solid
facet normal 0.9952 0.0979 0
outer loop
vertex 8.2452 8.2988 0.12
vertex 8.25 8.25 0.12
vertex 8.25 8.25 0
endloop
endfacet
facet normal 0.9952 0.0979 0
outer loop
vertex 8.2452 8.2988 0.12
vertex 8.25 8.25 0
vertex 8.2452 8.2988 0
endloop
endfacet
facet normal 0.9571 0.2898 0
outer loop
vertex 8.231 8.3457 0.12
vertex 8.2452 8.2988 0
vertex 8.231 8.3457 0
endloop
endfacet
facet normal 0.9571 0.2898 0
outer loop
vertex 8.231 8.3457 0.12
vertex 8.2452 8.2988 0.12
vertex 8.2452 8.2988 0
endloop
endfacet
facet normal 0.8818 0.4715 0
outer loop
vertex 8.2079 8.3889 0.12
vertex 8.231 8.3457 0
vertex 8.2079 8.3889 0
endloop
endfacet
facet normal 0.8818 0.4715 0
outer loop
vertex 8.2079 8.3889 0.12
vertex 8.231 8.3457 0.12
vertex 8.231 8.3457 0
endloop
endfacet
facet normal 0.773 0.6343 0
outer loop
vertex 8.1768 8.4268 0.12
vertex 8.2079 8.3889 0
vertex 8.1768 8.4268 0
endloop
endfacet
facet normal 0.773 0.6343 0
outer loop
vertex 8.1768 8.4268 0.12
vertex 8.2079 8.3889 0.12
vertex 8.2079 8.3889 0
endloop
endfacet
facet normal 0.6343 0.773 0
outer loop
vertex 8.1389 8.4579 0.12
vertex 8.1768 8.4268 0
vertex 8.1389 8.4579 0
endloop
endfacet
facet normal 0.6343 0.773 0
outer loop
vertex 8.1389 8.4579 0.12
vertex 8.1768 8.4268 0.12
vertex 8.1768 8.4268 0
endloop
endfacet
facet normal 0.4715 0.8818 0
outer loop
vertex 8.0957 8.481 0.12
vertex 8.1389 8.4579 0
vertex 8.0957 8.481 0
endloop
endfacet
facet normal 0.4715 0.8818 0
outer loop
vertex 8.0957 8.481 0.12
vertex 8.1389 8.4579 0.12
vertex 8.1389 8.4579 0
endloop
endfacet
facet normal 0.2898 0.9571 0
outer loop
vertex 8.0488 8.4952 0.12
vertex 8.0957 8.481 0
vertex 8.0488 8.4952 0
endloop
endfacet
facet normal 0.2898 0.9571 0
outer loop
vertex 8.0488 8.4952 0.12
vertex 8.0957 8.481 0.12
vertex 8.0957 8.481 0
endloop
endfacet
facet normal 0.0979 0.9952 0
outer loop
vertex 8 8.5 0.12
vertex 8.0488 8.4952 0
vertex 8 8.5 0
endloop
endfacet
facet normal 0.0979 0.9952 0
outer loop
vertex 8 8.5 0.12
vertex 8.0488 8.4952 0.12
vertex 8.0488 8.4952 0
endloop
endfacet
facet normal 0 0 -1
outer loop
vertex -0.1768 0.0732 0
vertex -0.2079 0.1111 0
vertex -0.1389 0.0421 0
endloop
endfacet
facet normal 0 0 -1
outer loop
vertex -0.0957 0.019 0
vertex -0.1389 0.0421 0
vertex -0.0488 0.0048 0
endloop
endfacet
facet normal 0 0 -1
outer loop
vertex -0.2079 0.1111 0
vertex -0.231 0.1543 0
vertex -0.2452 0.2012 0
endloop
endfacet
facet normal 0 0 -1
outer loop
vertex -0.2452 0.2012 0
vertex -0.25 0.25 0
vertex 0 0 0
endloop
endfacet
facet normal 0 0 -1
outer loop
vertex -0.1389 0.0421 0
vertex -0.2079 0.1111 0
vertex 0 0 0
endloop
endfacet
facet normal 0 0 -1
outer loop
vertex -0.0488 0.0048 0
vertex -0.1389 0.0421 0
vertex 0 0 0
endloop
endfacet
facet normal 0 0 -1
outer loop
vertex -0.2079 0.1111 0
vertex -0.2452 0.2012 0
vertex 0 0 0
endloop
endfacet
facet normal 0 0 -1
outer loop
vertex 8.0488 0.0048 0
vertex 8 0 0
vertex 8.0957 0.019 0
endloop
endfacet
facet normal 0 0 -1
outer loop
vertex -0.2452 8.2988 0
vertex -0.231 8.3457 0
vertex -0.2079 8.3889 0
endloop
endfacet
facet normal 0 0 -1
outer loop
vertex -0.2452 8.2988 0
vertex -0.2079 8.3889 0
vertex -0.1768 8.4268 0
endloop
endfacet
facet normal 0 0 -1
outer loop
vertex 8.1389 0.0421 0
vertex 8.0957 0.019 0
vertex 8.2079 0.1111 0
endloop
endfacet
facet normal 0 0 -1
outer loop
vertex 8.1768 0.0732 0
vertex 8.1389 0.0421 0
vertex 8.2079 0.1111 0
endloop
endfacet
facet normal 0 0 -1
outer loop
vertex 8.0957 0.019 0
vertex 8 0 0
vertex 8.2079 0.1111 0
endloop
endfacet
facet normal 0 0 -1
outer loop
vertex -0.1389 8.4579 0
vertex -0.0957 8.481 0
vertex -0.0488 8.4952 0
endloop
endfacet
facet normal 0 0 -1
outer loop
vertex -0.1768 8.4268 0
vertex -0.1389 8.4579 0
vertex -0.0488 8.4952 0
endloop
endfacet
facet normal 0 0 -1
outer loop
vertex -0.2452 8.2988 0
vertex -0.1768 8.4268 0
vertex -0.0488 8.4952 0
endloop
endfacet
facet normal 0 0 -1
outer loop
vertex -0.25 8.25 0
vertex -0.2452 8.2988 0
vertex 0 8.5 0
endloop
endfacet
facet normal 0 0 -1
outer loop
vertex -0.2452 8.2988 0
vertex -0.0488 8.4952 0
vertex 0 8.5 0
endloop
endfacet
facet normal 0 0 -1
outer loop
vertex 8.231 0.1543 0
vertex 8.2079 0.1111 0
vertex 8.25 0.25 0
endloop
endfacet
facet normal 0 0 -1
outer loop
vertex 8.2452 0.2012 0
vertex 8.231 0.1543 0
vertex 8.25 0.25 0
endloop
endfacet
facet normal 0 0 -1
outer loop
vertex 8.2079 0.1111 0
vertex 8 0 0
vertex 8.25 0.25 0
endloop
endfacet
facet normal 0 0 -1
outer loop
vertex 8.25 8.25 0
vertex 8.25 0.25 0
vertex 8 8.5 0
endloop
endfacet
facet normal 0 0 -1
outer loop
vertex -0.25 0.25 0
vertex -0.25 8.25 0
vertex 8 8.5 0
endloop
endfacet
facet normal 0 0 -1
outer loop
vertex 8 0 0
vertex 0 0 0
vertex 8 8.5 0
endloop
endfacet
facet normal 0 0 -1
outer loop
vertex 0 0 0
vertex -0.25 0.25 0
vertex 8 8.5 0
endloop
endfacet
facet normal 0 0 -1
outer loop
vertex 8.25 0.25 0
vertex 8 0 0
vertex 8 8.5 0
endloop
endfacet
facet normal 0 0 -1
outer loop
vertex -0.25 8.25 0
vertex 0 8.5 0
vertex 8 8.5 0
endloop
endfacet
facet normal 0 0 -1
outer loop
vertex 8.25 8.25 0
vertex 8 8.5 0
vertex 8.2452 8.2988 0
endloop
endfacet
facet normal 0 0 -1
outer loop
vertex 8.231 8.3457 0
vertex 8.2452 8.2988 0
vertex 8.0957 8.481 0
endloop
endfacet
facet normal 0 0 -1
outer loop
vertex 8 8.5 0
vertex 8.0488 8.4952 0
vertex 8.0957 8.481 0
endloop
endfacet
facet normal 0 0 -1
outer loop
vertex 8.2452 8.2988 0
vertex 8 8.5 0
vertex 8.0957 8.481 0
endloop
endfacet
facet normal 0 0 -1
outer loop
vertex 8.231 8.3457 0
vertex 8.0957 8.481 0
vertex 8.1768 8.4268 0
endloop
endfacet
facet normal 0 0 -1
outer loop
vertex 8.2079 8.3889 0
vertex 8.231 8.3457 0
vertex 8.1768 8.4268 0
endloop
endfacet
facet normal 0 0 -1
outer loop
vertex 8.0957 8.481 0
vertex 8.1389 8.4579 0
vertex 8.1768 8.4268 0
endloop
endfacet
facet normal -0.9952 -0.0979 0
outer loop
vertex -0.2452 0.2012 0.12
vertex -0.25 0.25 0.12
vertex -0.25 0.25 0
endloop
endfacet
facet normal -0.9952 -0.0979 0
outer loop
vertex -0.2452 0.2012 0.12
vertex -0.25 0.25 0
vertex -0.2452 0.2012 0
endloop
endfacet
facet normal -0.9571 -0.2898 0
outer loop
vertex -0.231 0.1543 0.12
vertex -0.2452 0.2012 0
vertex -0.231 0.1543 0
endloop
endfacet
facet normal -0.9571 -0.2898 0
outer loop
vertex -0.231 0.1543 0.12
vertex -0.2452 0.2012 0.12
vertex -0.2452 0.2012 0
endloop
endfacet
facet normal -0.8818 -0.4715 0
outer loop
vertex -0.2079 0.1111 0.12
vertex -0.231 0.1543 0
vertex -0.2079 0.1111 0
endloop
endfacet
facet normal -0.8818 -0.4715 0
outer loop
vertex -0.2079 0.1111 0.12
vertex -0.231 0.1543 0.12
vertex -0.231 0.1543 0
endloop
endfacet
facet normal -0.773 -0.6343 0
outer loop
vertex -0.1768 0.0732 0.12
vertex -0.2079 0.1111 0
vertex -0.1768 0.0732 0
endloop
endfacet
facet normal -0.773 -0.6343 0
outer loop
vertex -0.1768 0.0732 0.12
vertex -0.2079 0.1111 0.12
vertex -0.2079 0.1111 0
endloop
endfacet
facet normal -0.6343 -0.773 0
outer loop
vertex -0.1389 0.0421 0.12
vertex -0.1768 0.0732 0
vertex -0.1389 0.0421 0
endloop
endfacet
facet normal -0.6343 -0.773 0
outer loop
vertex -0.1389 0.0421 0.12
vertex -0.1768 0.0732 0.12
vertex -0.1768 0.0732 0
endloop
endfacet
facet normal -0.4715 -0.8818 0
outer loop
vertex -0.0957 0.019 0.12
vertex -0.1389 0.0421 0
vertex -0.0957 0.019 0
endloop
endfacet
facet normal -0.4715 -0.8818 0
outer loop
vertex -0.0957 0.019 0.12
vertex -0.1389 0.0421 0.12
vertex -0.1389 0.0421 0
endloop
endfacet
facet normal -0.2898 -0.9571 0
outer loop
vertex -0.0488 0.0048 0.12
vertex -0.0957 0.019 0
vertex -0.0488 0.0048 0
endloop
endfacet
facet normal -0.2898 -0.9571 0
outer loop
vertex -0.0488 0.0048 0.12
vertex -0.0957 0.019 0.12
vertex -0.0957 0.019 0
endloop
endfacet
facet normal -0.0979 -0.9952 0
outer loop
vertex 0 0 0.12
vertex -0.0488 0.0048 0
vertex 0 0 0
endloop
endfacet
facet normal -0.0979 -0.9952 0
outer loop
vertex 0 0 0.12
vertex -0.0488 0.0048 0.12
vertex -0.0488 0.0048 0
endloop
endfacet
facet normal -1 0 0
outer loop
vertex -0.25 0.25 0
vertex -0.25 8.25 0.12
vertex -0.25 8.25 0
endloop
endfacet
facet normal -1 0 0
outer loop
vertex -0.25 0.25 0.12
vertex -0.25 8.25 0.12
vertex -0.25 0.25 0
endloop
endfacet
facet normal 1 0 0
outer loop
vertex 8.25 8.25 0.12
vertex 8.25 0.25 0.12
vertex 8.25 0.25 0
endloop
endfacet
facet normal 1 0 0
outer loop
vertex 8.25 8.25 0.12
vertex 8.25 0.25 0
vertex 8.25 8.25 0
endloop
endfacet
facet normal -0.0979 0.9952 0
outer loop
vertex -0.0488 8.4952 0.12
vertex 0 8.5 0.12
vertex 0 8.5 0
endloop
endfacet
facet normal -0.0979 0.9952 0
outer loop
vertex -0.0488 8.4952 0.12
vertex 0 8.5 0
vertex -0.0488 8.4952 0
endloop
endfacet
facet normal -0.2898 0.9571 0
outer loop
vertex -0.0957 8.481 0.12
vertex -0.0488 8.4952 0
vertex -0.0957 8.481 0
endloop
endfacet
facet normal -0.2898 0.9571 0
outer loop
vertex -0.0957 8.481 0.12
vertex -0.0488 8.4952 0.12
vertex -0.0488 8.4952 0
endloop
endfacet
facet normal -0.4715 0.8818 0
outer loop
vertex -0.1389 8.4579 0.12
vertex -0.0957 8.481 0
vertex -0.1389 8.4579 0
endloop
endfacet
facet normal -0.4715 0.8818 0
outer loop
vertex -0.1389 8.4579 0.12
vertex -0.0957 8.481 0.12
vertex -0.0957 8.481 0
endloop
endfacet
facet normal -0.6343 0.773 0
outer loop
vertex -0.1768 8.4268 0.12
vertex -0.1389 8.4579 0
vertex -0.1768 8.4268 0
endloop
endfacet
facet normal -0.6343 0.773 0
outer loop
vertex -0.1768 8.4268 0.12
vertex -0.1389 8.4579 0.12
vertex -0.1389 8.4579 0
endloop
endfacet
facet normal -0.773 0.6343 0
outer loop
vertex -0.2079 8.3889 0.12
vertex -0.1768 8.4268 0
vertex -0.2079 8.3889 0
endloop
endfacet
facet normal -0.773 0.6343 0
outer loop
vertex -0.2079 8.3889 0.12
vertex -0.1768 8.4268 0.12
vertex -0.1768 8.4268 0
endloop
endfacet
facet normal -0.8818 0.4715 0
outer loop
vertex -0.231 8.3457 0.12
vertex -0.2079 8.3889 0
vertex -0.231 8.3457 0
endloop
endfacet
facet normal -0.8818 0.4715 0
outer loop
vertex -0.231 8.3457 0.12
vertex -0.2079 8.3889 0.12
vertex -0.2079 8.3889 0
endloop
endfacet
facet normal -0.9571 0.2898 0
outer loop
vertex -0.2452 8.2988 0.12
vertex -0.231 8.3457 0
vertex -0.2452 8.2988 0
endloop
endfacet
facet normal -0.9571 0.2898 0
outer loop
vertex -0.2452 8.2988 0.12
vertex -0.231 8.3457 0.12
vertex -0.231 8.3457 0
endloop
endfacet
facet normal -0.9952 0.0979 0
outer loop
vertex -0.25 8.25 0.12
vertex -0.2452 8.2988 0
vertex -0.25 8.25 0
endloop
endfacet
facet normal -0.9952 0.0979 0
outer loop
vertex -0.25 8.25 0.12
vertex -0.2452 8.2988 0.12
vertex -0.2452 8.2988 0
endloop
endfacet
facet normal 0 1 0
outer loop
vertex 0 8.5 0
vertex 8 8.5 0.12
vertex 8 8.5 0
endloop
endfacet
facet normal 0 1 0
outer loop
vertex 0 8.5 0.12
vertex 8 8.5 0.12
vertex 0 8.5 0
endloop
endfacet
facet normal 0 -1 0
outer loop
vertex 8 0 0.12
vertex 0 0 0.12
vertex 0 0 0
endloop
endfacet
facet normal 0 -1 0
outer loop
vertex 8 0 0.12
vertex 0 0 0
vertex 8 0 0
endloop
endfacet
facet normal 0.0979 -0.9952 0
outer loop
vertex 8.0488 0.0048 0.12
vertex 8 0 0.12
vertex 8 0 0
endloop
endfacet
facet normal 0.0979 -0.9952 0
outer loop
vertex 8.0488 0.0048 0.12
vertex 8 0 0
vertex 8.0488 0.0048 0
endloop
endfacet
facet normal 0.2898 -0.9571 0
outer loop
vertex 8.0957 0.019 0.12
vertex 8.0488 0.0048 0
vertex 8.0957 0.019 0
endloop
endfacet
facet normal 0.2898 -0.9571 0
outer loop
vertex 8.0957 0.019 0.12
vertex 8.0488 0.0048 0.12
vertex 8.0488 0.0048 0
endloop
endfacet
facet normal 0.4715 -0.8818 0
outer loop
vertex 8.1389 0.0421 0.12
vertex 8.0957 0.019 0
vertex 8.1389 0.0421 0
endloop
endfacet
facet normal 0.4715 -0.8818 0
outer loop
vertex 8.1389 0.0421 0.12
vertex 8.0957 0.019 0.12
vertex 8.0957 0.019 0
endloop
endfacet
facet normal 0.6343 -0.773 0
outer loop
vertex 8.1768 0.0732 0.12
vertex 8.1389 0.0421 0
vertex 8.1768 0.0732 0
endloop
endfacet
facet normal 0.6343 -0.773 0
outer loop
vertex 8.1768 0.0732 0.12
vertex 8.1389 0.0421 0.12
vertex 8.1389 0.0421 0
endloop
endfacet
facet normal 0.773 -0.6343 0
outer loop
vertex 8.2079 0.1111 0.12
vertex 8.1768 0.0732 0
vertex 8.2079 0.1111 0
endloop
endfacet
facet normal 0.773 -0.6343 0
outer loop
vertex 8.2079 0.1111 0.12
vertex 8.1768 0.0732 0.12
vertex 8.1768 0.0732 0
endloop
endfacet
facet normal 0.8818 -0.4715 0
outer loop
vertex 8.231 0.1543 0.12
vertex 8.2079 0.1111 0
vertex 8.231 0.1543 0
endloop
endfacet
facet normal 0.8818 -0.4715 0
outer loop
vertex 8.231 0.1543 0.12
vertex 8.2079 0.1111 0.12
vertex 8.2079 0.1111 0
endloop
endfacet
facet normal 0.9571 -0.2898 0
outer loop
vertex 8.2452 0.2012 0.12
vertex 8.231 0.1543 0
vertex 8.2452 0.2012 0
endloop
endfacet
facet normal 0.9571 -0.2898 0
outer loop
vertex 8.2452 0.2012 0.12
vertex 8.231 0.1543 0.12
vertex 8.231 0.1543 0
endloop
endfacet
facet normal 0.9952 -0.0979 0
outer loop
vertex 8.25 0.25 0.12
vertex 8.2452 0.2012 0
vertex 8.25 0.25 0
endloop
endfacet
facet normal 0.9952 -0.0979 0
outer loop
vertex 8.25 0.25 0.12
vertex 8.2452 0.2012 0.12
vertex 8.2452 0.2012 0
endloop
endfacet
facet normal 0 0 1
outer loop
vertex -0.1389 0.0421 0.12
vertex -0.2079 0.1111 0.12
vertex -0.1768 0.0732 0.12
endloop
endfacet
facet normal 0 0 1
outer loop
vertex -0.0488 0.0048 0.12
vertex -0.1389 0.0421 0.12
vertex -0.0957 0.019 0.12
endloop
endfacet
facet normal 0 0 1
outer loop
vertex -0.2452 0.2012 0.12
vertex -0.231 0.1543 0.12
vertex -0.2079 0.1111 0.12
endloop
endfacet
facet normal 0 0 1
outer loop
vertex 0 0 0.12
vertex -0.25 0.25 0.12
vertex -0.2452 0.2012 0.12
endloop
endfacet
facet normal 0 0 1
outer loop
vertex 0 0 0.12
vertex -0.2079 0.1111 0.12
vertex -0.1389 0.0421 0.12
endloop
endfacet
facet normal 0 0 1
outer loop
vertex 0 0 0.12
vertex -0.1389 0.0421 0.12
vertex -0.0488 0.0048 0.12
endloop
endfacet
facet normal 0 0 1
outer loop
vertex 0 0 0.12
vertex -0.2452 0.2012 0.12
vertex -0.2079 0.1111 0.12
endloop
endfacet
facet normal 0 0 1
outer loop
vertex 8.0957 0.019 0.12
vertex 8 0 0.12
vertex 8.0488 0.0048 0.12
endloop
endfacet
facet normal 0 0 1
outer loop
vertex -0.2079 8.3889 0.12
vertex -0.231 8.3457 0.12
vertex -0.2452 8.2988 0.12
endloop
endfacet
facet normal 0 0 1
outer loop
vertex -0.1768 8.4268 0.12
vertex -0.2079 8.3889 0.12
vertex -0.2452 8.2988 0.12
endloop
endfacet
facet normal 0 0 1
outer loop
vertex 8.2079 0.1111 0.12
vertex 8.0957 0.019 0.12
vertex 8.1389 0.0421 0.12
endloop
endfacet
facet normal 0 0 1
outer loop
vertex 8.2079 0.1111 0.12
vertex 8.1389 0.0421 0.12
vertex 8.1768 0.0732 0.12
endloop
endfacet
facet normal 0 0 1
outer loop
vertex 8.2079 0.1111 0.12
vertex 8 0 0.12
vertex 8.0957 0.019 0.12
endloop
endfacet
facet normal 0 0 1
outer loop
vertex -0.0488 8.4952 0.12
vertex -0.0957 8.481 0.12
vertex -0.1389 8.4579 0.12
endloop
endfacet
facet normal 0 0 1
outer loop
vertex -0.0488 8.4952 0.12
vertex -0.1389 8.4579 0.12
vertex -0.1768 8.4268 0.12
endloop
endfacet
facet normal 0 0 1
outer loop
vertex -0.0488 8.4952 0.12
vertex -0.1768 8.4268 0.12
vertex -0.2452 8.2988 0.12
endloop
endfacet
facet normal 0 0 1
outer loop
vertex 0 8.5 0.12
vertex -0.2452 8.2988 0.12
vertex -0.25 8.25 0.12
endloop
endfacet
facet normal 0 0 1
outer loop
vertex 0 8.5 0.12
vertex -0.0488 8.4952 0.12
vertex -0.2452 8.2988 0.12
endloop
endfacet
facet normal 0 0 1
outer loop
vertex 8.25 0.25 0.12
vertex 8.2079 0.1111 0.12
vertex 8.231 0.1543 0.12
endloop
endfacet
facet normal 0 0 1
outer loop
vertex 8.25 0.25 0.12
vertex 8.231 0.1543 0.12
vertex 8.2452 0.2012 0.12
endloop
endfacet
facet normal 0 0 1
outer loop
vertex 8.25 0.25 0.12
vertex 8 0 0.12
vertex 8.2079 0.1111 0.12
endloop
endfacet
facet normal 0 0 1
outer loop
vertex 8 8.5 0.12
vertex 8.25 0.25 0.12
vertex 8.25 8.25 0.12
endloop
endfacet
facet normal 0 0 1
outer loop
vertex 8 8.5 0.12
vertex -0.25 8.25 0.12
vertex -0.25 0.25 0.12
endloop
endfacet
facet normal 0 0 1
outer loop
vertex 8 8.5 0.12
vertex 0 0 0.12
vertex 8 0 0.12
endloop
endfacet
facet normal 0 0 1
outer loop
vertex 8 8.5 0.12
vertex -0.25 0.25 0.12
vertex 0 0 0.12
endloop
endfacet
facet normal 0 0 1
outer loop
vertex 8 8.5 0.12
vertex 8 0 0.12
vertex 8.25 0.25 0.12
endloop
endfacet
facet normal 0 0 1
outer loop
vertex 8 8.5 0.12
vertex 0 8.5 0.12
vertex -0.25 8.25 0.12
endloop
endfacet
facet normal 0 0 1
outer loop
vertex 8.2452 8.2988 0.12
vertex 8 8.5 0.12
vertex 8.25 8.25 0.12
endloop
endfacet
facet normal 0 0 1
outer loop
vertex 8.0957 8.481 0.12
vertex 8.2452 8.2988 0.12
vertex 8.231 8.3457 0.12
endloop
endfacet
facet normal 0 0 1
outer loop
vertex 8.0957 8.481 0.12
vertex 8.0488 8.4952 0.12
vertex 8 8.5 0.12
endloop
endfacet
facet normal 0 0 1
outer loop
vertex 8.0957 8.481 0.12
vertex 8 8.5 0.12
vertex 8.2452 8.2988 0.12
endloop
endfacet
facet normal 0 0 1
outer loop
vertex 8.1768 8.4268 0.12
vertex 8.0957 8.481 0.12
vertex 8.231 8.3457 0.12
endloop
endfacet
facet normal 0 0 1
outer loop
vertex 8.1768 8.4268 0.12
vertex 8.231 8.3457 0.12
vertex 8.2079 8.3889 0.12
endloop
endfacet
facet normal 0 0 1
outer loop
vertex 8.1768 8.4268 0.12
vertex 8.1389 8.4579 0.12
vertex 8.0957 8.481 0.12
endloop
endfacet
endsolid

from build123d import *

# Parameters (mm, degrees)
BOSS_EXTRUDE1_DEPTH = 0.12


with BuildPart() as part:
    # Sketch1 → Boss-Extrude1 (new body)
    with BuildSketch(Plane.XY.offset(0.12)):
        with BuildLine():
            Line((8.25, 0.25), (8.25, 8.25))
            ThreePointArc((8.25, 8.25), (8.176776695, 8.426776695), (8, 8.5))
            Line((8, 8.5), (0, 8.5))
            ThreePointArc((0, 8.5), (-0.176776695, 8.426776695), (-0.25, 8.25))
            Line((-0.25, 8.25), (-0.25, 0.25))
            ThreePointArc((-0.25, 0.25), (-0.176776695, 0.073223305), (0, 0))
            Line((0, 0), (8, 0))
            ThreePointArc((8, 0), (8.176776695, 0.073223305), (8.25, 0.25))
        make_face()
    extrude(amount=-BOSS_EXTRUDE1_DEPTH)


solid = part.part
